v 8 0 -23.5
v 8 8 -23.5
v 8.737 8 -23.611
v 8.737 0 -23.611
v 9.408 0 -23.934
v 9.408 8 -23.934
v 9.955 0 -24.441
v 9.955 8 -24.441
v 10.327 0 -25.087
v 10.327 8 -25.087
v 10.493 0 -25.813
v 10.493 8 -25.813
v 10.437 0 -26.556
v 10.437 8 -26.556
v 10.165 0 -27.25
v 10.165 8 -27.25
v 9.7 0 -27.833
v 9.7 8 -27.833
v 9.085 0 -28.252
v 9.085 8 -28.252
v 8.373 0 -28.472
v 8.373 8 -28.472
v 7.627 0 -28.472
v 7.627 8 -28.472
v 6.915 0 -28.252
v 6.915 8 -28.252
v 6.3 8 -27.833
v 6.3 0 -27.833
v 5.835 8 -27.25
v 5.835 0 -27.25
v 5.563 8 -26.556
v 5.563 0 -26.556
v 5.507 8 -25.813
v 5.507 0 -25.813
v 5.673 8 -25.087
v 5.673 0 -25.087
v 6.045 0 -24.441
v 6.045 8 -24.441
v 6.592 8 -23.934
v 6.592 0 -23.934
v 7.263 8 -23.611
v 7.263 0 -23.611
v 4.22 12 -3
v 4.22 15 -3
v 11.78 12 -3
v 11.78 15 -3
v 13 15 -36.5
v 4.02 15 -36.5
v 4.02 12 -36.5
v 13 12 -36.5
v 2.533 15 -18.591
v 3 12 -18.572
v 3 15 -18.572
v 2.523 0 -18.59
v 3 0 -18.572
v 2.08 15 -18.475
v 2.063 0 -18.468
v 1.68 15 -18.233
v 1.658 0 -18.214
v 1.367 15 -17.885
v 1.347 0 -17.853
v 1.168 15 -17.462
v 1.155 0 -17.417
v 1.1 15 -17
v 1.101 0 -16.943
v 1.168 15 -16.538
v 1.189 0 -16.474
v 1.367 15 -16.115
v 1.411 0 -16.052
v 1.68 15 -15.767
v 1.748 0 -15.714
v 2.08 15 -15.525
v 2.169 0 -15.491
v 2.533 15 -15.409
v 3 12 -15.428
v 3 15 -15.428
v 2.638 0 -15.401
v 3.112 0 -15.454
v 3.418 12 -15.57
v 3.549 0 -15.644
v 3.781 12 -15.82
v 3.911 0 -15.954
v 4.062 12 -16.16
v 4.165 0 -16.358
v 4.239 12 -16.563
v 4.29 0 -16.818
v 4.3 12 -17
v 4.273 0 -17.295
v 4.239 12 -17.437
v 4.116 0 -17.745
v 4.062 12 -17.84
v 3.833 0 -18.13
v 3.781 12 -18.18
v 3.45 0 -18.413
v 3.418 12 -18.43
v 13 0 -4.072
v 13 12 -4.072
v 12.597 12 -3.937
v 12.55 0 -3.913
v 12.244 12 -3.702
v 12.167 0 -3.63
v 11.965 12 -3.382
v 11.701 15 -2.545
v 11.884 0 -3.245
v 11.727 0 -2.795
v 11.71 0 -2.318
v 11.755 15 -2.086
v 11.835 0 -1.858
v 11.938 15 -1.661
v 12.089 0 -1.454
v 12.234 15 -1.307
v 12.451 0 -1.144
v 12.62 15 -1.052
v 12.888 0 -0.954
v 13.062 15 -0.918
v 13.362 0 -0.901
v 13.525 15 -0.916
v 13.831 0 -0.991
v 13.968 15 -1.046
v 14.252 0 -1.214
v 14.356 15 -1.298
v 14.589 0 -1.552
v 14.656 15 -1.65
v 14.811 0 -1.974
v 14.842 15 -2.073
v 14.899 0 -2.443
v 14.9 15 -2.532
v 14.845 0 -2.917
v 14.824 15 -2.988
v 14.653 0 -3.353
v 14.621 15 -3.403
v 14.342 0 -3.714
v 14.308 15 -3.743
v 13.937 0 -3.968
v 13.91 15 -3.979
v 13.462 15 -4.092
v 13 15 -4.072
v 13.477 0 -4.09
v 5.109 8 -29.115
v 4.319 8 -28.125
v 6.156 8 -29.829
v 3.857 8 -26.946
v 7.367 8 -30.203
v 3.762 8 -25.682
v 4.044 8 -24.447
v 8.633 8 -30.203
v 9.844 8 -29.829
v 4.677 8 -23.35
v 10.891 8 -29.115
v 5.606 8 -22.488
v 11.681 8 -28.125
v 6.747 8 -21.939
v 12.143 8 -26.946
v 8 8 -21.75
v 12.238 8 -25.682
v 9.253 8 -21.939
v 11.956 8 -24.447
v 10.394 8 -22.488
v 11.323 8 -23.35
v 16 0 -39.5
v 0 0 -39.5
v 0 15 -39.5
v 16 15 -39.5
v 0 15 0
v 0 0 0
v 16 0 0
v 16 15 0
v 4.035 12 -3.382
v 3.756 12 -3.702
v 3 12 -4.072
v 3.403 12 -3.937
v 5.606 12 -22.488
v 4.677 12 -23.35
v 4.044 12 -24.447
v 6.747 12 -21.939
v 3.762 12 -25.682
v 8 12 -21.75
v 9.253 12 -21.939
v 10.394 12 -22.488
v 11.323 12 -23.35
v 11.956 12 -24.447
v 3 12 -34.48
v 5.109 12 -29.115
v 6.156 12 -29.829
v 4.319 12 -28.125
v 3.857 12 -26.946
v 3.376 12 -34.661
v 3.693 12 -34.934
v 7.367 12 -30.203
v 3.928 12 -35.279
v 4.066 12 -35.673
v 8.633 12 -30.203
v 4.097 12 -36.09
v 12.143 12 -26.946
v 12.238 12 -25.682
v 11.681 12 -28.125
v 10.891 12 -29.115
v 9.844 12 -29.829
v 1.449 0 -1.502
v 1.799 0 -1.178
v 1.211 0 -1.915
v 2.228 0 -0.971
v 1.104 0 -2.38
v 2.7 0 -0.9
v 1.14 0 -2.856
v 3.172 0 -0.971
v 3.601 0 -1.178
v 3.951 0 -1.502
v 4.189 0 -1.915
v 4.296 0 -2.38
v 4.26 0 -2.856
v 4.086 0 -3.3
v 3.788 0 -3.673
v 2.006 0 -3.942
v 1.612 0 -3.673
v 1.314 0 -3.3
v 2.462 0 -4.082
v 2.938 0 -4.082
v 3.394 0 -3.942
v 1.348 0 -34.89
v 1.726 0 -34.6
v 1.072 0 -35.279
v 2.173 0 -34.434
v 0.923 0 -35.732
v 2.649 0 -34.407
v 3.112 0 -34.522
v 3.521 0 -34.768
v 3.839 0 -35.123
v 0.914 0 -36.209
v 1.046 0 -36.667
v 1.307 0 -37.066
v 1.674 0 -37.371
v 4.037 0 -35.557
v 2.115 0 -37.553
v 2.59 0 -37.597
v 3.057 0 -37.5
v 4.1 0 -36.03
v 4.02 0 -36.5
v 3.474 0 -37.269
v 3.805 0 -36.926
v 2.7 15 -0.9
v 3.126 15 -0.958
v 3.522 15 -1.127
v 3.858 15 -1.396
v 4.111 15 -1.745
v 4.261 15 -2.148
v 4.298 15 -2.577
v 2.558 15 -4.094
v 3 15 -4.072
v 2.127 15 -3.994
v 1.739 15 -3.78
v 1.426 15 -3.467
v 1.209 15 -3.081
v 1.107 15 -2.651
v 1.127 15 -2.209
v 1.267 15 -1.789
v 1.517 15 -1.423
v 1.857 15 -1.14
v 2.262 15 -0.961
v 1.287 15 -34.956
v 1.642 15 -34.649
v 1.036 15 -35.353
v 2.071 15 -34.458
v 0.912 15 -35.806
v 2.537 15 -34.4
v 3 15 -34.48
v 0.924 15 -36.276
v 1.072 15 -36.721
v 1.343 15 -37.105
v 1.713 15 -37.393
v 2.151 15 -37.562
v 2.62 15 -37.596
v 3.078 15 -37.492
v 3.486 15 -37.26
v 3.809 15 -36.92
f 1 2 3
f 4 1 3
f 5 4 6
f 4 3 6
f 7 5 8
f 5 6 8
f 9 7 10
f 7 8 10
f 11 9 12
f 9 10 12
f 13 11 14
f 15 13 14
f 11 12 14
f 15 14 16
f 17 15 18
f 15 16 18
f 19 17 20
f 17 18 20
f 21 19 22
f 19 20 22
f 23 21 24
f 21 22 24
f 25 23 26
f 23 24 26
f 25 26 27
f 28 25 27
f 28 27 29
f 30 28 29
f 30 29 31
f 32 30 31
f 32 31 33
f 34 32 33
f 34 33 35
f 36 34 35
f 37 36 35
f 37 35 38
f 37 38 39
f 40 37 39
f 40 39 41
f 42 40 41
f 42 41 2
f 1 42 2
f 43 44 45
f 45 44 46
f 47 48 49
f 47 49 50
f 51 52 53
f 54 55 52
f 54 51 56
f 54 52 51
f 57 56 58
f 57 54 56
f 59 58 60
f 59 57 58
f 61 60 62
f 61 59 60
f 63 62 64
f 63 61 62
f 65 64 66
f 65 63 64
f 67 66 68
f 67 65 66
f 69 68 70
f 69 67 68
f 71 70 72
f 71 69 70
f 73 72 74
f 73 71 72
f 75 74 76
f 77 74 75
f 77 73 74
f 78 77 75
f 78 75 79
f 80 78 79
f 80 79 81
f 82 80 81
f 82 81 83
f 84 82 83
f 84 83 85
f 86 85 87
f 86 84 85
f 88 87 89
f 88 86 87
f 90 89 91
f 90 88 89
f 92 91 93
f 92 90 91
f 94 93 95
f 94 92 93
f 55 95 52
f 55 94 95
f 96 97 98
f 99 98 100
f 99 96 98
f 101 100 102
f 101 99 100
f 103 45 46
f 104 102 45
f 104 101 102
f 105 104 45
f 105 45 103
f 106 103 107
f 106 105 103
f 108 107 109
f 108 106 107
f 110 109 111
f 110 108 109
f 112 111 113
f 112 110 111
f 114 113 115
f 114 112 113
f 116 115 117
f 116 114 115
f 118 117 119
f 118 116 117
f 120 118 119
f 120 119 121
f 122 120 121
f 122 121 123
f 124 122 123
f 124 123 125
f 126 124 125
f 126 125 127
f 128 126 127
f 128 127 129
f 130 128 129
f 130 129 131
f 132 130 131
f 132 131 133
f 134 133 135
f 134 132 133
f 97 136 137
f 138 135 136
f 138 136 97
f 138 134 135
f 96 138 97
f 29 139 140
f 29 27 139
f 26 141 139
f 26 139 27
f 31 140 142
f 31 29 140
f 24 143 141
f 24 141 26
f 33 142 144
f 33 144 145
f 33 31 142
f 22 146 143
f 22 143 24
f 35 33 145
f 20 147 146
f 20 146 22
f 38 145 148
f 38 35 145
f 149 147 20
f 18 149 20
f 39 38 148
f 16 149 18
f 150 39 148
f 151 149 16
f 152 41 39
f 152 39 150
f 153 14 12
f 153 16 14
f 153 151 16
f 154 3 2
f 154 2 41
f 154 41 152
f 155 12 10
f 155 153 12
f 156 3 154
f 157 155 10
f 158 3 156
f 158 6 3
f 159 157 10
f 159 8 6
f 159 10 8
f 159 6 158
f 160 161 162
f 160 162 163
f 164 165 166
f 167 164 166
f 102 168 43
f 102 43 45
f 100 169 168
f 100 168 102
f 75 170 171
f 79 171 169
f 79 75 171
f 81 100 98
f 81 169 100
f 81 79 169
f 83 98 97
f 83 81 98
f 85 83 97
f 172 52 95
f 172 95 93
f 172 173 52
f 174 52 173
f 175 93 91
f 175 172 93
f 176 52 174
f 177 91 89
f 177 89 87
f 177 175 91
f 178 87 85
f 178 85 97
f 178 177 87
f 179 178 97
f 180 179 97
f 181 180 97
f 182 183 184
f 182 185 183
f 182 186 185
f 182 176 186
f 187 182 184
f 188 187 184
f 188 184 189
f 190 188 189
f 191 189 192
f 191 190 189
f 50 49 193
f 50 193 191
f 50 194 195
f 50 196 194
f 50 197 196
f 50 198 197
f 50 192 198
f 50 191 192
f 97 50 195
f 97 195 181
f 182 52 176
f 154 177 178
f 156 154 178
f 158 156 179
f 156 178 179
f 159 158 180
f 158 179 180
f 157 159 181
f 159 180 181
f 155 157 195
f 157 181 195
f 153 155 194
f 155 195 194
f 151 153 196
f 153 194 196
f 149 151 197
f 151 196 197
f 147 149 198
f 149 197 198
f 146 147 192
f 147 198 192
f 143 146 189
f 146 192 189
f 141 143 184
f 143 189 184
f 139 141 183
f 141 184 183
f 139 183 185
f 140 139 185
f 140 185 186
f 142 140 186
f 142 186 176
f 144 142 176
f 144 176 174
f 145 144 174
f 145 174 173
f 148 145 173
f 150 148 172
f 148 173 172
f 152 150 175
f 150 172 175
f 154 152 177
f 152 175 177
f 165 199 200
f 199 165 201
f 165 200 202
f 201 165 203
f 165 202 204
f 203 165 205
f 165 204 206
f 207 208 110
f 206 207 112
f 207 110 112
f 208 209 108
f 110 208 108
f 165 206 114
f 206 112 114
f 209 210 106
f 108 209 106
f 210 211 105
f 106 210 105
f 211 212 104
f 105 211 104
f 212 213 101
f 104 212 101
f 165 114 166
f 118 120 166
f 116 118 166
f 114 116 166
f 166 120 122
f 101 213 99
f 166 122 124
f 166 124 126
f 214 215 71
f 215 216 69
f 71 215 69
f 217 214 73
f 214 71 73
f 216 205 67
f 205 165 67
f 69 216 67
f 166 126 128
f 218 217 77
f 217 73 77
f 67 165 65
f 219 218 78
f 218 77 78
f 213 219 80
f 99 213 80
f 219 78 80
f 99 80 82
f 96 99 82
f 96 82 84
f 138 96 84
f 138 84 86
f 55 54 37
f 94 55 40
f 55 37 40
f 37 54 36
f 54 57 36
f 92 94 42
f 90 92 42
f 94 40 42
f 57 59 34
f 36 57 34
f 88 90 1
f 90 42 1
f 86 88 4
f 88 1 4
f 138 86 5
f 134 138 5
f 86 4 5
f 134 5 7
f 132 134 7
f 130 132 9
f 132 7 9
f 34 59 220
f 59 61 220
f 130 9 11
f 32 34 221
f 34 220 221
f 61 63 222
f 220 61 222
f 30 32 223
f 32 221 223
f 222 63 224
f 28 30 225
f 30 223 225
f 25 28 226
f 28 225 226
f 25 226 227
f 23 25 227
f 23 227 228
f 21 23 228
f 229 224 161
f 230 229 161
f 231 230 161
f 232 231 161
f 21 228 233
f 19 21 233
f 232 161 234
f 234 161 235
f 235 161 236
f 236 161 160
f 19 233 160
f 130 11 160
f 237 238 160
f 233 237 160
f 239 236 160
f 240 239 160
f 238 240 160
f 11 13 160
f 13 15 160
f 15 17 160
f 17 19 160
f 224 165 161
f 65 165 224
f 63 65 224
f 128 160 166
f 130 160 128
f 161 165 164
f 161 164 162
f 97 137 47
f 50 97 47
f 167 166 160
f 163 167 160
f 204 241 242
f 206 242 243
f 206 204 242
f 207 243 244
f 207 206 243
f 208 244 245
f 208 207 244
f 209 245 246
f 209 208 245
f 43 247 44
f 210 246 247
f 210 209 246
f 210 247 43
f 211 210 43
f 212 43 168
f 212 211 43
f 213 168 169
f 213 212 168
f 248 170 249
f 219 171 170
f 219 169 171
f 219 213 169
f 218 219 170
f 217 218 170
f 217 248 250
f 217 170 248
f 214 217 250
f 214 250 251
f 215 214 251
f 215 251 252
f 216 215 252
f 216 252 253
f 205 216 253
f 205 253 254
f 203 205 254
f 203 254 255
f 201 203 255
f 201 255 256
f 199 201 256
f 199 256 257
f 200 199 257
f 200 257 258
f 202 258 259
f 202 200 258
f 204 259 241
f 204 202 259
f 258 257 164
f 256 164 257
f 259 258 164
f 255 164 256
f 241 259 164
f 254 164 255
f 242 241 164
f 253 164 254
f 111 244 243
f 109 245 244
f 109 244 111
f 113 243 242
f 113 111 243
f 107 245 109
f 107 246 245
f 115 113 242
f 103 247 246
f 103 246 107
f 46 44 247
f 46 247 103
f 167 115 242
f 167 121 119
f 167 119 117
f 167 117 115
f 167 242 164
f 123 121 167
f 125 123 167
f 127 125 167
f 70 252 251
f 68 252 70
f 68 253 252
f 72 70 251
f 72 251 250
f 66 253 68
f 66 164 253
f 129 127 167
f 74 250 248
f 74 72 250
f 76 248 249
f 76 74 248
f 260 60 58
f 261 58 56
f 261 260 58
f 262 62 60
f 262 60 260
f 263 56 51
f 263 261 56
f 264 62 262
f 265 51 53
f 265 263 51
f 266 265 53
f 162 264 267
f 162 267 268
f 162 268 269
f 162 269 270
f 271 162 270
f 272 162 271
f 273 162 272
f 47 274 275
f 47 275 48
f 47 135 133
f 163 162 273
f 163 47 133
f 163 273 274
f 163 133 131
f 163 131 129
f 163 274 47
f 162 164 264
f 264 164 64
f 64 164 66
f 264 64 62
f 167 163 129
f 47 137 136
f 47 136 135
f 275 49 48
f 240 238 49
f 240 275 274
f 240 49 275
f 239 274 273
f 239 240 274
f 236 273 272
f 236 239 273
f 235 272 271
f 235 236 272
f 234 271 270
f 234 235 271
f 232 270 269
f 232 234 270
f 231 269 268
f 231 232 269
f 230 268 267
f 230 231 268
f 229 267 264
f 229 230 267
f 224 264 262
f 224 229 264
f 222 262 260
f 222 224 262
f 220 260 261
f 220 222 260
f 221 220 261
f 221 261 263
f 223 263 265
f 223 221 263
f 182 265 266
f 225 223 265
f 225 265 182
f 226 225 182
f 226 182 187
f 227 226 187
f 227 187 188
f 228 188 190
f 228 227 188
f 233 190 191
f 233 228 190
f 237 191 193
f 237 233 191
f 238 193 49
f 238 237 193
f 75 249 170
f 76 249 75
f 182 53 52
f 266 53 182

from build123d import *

# Parameters (mm, degrees)
SKETCH1_W               = 16
SKETCH1_H               = 39.5
BOSS_EXTRUDE1_DEPTH     = 15
SKETCH2_W               = 10
SKETCH2_H               = 33.5
CUT_EXTRUDE1_DEPTH      = 3
CUT_EXTRUDE2_DEPTH      = 45.274710615
CUT_EXTRUDE2_DEPTH_BACK = 45.274710615
SKETCH3_R               = 1.6
CUT_EXTRUDE3_DEPTH      = 3
CUT_EXTRUDE3_DEPTH_BACK = 46.180194776
SKETCH4_R               = 1.6
SKETCH5_R               = 2.5
CUT_EXTRUDE4_DEPTH      = 20
SKETCH7_R               = 4.25
CUT_EXTRUDE5_DEPTH      = 4


with BuildPart() as part:
    # Sketch1 → Boss-Extrude1 (new body)
    with BuildSketch(Plane(origin=(0, 0, 0), x_dir=(1, 0, 0), z_dir=(0, 1, 0))):
        with Locations((8, 19.75)):
            Rectangle(SKETCH1_W, SKETCH1_H)
    extrude(amount=BOSS_EXTRUDE1_DEPTH)

    # Sketch2 → Cut-Extrude1 (cut)
    with BuildSketch(Plane(origin=(0, 15, 0), x_dir=(1, 0, 0), z_dir=(0, 1, 0))):
        with Locations((8, 19.75)):
            Rectangle(SKETCH2_W, SKETCH2_H)
    extrude(amount=-CUT_EXTRUDE1_DEPTH, mode=Mode.SUBTRACT)

    # Sketch3 → Cut-Extrude2 (cut, two sides: drawn at the far end of the back side and taken through both)
    with BuildSketch(Plane(origin=(0, 12, 0), x_dir=(1, 0, 0), z_dir=(0, 1, 0)).offset(-CUT_EXTRUDE2_DEPTH_BACK)):
        with Locations((2.7, 2.5)):
            Circle(SKETCH3_R)
    extrude(amount=CUT_EXTRUDE2_DEPTH + CUT_EXTRUDE2_DEPTH_BACK, mode=Mode.SUBTRACT)

    # Sketch4 → Cut-Extrude3 (cut, two sides: drawn at the far end of the back side and taken through both)
    with BuildSketch(Plane(origin=(0, 15, 0), x_dir=(1, 0, 0), z_dir=(0, 1, 0)).offset(-CUT_EXTRUDE3_DEPTH_BACK)):
        with Locations((13.3, 2.5)):
            Circle(SKETCH4_R)
        with Locations((2.7, 17)):
            Circle(SKETCH4_R)
        with Locations((2.5, 36)):
            Circle(SKETCH4_R)
    extrude(amount=CUT_EXTRUDE3_DEPTH + CUT_EXTRUDE3_DEPTH_BACK, mode=Mode.SUBTRACT)

    # Sketch5 → Cut-Extrude4 (cut)
    with BuildSketch(Plane(origin=(0, 12, 0), x_dir=(1, 0, 0), z_dir=(0, 1, 0))):
        with Locations((8, 26)):
            Circle(SKETCH5_R)
    extrude(amount=-CUT_EXTRUDE4_DEPTH, mode=Mode.SUBTRACT)

    # Sketch7 → Cut-Extrude5 (cut)
    with BuildSketch(Plane(origin=(0, 12, 0), x_dir=(1, 0, 0), z_dir=(0, 1, 0))):
        with Locations((8, 26)):
            Circle(SKETCH7_R)
    extrude(amount=-CUT_EXTRUDE5_DEPTH, mode=Mode.SUBTRACT)


solid = part.part
